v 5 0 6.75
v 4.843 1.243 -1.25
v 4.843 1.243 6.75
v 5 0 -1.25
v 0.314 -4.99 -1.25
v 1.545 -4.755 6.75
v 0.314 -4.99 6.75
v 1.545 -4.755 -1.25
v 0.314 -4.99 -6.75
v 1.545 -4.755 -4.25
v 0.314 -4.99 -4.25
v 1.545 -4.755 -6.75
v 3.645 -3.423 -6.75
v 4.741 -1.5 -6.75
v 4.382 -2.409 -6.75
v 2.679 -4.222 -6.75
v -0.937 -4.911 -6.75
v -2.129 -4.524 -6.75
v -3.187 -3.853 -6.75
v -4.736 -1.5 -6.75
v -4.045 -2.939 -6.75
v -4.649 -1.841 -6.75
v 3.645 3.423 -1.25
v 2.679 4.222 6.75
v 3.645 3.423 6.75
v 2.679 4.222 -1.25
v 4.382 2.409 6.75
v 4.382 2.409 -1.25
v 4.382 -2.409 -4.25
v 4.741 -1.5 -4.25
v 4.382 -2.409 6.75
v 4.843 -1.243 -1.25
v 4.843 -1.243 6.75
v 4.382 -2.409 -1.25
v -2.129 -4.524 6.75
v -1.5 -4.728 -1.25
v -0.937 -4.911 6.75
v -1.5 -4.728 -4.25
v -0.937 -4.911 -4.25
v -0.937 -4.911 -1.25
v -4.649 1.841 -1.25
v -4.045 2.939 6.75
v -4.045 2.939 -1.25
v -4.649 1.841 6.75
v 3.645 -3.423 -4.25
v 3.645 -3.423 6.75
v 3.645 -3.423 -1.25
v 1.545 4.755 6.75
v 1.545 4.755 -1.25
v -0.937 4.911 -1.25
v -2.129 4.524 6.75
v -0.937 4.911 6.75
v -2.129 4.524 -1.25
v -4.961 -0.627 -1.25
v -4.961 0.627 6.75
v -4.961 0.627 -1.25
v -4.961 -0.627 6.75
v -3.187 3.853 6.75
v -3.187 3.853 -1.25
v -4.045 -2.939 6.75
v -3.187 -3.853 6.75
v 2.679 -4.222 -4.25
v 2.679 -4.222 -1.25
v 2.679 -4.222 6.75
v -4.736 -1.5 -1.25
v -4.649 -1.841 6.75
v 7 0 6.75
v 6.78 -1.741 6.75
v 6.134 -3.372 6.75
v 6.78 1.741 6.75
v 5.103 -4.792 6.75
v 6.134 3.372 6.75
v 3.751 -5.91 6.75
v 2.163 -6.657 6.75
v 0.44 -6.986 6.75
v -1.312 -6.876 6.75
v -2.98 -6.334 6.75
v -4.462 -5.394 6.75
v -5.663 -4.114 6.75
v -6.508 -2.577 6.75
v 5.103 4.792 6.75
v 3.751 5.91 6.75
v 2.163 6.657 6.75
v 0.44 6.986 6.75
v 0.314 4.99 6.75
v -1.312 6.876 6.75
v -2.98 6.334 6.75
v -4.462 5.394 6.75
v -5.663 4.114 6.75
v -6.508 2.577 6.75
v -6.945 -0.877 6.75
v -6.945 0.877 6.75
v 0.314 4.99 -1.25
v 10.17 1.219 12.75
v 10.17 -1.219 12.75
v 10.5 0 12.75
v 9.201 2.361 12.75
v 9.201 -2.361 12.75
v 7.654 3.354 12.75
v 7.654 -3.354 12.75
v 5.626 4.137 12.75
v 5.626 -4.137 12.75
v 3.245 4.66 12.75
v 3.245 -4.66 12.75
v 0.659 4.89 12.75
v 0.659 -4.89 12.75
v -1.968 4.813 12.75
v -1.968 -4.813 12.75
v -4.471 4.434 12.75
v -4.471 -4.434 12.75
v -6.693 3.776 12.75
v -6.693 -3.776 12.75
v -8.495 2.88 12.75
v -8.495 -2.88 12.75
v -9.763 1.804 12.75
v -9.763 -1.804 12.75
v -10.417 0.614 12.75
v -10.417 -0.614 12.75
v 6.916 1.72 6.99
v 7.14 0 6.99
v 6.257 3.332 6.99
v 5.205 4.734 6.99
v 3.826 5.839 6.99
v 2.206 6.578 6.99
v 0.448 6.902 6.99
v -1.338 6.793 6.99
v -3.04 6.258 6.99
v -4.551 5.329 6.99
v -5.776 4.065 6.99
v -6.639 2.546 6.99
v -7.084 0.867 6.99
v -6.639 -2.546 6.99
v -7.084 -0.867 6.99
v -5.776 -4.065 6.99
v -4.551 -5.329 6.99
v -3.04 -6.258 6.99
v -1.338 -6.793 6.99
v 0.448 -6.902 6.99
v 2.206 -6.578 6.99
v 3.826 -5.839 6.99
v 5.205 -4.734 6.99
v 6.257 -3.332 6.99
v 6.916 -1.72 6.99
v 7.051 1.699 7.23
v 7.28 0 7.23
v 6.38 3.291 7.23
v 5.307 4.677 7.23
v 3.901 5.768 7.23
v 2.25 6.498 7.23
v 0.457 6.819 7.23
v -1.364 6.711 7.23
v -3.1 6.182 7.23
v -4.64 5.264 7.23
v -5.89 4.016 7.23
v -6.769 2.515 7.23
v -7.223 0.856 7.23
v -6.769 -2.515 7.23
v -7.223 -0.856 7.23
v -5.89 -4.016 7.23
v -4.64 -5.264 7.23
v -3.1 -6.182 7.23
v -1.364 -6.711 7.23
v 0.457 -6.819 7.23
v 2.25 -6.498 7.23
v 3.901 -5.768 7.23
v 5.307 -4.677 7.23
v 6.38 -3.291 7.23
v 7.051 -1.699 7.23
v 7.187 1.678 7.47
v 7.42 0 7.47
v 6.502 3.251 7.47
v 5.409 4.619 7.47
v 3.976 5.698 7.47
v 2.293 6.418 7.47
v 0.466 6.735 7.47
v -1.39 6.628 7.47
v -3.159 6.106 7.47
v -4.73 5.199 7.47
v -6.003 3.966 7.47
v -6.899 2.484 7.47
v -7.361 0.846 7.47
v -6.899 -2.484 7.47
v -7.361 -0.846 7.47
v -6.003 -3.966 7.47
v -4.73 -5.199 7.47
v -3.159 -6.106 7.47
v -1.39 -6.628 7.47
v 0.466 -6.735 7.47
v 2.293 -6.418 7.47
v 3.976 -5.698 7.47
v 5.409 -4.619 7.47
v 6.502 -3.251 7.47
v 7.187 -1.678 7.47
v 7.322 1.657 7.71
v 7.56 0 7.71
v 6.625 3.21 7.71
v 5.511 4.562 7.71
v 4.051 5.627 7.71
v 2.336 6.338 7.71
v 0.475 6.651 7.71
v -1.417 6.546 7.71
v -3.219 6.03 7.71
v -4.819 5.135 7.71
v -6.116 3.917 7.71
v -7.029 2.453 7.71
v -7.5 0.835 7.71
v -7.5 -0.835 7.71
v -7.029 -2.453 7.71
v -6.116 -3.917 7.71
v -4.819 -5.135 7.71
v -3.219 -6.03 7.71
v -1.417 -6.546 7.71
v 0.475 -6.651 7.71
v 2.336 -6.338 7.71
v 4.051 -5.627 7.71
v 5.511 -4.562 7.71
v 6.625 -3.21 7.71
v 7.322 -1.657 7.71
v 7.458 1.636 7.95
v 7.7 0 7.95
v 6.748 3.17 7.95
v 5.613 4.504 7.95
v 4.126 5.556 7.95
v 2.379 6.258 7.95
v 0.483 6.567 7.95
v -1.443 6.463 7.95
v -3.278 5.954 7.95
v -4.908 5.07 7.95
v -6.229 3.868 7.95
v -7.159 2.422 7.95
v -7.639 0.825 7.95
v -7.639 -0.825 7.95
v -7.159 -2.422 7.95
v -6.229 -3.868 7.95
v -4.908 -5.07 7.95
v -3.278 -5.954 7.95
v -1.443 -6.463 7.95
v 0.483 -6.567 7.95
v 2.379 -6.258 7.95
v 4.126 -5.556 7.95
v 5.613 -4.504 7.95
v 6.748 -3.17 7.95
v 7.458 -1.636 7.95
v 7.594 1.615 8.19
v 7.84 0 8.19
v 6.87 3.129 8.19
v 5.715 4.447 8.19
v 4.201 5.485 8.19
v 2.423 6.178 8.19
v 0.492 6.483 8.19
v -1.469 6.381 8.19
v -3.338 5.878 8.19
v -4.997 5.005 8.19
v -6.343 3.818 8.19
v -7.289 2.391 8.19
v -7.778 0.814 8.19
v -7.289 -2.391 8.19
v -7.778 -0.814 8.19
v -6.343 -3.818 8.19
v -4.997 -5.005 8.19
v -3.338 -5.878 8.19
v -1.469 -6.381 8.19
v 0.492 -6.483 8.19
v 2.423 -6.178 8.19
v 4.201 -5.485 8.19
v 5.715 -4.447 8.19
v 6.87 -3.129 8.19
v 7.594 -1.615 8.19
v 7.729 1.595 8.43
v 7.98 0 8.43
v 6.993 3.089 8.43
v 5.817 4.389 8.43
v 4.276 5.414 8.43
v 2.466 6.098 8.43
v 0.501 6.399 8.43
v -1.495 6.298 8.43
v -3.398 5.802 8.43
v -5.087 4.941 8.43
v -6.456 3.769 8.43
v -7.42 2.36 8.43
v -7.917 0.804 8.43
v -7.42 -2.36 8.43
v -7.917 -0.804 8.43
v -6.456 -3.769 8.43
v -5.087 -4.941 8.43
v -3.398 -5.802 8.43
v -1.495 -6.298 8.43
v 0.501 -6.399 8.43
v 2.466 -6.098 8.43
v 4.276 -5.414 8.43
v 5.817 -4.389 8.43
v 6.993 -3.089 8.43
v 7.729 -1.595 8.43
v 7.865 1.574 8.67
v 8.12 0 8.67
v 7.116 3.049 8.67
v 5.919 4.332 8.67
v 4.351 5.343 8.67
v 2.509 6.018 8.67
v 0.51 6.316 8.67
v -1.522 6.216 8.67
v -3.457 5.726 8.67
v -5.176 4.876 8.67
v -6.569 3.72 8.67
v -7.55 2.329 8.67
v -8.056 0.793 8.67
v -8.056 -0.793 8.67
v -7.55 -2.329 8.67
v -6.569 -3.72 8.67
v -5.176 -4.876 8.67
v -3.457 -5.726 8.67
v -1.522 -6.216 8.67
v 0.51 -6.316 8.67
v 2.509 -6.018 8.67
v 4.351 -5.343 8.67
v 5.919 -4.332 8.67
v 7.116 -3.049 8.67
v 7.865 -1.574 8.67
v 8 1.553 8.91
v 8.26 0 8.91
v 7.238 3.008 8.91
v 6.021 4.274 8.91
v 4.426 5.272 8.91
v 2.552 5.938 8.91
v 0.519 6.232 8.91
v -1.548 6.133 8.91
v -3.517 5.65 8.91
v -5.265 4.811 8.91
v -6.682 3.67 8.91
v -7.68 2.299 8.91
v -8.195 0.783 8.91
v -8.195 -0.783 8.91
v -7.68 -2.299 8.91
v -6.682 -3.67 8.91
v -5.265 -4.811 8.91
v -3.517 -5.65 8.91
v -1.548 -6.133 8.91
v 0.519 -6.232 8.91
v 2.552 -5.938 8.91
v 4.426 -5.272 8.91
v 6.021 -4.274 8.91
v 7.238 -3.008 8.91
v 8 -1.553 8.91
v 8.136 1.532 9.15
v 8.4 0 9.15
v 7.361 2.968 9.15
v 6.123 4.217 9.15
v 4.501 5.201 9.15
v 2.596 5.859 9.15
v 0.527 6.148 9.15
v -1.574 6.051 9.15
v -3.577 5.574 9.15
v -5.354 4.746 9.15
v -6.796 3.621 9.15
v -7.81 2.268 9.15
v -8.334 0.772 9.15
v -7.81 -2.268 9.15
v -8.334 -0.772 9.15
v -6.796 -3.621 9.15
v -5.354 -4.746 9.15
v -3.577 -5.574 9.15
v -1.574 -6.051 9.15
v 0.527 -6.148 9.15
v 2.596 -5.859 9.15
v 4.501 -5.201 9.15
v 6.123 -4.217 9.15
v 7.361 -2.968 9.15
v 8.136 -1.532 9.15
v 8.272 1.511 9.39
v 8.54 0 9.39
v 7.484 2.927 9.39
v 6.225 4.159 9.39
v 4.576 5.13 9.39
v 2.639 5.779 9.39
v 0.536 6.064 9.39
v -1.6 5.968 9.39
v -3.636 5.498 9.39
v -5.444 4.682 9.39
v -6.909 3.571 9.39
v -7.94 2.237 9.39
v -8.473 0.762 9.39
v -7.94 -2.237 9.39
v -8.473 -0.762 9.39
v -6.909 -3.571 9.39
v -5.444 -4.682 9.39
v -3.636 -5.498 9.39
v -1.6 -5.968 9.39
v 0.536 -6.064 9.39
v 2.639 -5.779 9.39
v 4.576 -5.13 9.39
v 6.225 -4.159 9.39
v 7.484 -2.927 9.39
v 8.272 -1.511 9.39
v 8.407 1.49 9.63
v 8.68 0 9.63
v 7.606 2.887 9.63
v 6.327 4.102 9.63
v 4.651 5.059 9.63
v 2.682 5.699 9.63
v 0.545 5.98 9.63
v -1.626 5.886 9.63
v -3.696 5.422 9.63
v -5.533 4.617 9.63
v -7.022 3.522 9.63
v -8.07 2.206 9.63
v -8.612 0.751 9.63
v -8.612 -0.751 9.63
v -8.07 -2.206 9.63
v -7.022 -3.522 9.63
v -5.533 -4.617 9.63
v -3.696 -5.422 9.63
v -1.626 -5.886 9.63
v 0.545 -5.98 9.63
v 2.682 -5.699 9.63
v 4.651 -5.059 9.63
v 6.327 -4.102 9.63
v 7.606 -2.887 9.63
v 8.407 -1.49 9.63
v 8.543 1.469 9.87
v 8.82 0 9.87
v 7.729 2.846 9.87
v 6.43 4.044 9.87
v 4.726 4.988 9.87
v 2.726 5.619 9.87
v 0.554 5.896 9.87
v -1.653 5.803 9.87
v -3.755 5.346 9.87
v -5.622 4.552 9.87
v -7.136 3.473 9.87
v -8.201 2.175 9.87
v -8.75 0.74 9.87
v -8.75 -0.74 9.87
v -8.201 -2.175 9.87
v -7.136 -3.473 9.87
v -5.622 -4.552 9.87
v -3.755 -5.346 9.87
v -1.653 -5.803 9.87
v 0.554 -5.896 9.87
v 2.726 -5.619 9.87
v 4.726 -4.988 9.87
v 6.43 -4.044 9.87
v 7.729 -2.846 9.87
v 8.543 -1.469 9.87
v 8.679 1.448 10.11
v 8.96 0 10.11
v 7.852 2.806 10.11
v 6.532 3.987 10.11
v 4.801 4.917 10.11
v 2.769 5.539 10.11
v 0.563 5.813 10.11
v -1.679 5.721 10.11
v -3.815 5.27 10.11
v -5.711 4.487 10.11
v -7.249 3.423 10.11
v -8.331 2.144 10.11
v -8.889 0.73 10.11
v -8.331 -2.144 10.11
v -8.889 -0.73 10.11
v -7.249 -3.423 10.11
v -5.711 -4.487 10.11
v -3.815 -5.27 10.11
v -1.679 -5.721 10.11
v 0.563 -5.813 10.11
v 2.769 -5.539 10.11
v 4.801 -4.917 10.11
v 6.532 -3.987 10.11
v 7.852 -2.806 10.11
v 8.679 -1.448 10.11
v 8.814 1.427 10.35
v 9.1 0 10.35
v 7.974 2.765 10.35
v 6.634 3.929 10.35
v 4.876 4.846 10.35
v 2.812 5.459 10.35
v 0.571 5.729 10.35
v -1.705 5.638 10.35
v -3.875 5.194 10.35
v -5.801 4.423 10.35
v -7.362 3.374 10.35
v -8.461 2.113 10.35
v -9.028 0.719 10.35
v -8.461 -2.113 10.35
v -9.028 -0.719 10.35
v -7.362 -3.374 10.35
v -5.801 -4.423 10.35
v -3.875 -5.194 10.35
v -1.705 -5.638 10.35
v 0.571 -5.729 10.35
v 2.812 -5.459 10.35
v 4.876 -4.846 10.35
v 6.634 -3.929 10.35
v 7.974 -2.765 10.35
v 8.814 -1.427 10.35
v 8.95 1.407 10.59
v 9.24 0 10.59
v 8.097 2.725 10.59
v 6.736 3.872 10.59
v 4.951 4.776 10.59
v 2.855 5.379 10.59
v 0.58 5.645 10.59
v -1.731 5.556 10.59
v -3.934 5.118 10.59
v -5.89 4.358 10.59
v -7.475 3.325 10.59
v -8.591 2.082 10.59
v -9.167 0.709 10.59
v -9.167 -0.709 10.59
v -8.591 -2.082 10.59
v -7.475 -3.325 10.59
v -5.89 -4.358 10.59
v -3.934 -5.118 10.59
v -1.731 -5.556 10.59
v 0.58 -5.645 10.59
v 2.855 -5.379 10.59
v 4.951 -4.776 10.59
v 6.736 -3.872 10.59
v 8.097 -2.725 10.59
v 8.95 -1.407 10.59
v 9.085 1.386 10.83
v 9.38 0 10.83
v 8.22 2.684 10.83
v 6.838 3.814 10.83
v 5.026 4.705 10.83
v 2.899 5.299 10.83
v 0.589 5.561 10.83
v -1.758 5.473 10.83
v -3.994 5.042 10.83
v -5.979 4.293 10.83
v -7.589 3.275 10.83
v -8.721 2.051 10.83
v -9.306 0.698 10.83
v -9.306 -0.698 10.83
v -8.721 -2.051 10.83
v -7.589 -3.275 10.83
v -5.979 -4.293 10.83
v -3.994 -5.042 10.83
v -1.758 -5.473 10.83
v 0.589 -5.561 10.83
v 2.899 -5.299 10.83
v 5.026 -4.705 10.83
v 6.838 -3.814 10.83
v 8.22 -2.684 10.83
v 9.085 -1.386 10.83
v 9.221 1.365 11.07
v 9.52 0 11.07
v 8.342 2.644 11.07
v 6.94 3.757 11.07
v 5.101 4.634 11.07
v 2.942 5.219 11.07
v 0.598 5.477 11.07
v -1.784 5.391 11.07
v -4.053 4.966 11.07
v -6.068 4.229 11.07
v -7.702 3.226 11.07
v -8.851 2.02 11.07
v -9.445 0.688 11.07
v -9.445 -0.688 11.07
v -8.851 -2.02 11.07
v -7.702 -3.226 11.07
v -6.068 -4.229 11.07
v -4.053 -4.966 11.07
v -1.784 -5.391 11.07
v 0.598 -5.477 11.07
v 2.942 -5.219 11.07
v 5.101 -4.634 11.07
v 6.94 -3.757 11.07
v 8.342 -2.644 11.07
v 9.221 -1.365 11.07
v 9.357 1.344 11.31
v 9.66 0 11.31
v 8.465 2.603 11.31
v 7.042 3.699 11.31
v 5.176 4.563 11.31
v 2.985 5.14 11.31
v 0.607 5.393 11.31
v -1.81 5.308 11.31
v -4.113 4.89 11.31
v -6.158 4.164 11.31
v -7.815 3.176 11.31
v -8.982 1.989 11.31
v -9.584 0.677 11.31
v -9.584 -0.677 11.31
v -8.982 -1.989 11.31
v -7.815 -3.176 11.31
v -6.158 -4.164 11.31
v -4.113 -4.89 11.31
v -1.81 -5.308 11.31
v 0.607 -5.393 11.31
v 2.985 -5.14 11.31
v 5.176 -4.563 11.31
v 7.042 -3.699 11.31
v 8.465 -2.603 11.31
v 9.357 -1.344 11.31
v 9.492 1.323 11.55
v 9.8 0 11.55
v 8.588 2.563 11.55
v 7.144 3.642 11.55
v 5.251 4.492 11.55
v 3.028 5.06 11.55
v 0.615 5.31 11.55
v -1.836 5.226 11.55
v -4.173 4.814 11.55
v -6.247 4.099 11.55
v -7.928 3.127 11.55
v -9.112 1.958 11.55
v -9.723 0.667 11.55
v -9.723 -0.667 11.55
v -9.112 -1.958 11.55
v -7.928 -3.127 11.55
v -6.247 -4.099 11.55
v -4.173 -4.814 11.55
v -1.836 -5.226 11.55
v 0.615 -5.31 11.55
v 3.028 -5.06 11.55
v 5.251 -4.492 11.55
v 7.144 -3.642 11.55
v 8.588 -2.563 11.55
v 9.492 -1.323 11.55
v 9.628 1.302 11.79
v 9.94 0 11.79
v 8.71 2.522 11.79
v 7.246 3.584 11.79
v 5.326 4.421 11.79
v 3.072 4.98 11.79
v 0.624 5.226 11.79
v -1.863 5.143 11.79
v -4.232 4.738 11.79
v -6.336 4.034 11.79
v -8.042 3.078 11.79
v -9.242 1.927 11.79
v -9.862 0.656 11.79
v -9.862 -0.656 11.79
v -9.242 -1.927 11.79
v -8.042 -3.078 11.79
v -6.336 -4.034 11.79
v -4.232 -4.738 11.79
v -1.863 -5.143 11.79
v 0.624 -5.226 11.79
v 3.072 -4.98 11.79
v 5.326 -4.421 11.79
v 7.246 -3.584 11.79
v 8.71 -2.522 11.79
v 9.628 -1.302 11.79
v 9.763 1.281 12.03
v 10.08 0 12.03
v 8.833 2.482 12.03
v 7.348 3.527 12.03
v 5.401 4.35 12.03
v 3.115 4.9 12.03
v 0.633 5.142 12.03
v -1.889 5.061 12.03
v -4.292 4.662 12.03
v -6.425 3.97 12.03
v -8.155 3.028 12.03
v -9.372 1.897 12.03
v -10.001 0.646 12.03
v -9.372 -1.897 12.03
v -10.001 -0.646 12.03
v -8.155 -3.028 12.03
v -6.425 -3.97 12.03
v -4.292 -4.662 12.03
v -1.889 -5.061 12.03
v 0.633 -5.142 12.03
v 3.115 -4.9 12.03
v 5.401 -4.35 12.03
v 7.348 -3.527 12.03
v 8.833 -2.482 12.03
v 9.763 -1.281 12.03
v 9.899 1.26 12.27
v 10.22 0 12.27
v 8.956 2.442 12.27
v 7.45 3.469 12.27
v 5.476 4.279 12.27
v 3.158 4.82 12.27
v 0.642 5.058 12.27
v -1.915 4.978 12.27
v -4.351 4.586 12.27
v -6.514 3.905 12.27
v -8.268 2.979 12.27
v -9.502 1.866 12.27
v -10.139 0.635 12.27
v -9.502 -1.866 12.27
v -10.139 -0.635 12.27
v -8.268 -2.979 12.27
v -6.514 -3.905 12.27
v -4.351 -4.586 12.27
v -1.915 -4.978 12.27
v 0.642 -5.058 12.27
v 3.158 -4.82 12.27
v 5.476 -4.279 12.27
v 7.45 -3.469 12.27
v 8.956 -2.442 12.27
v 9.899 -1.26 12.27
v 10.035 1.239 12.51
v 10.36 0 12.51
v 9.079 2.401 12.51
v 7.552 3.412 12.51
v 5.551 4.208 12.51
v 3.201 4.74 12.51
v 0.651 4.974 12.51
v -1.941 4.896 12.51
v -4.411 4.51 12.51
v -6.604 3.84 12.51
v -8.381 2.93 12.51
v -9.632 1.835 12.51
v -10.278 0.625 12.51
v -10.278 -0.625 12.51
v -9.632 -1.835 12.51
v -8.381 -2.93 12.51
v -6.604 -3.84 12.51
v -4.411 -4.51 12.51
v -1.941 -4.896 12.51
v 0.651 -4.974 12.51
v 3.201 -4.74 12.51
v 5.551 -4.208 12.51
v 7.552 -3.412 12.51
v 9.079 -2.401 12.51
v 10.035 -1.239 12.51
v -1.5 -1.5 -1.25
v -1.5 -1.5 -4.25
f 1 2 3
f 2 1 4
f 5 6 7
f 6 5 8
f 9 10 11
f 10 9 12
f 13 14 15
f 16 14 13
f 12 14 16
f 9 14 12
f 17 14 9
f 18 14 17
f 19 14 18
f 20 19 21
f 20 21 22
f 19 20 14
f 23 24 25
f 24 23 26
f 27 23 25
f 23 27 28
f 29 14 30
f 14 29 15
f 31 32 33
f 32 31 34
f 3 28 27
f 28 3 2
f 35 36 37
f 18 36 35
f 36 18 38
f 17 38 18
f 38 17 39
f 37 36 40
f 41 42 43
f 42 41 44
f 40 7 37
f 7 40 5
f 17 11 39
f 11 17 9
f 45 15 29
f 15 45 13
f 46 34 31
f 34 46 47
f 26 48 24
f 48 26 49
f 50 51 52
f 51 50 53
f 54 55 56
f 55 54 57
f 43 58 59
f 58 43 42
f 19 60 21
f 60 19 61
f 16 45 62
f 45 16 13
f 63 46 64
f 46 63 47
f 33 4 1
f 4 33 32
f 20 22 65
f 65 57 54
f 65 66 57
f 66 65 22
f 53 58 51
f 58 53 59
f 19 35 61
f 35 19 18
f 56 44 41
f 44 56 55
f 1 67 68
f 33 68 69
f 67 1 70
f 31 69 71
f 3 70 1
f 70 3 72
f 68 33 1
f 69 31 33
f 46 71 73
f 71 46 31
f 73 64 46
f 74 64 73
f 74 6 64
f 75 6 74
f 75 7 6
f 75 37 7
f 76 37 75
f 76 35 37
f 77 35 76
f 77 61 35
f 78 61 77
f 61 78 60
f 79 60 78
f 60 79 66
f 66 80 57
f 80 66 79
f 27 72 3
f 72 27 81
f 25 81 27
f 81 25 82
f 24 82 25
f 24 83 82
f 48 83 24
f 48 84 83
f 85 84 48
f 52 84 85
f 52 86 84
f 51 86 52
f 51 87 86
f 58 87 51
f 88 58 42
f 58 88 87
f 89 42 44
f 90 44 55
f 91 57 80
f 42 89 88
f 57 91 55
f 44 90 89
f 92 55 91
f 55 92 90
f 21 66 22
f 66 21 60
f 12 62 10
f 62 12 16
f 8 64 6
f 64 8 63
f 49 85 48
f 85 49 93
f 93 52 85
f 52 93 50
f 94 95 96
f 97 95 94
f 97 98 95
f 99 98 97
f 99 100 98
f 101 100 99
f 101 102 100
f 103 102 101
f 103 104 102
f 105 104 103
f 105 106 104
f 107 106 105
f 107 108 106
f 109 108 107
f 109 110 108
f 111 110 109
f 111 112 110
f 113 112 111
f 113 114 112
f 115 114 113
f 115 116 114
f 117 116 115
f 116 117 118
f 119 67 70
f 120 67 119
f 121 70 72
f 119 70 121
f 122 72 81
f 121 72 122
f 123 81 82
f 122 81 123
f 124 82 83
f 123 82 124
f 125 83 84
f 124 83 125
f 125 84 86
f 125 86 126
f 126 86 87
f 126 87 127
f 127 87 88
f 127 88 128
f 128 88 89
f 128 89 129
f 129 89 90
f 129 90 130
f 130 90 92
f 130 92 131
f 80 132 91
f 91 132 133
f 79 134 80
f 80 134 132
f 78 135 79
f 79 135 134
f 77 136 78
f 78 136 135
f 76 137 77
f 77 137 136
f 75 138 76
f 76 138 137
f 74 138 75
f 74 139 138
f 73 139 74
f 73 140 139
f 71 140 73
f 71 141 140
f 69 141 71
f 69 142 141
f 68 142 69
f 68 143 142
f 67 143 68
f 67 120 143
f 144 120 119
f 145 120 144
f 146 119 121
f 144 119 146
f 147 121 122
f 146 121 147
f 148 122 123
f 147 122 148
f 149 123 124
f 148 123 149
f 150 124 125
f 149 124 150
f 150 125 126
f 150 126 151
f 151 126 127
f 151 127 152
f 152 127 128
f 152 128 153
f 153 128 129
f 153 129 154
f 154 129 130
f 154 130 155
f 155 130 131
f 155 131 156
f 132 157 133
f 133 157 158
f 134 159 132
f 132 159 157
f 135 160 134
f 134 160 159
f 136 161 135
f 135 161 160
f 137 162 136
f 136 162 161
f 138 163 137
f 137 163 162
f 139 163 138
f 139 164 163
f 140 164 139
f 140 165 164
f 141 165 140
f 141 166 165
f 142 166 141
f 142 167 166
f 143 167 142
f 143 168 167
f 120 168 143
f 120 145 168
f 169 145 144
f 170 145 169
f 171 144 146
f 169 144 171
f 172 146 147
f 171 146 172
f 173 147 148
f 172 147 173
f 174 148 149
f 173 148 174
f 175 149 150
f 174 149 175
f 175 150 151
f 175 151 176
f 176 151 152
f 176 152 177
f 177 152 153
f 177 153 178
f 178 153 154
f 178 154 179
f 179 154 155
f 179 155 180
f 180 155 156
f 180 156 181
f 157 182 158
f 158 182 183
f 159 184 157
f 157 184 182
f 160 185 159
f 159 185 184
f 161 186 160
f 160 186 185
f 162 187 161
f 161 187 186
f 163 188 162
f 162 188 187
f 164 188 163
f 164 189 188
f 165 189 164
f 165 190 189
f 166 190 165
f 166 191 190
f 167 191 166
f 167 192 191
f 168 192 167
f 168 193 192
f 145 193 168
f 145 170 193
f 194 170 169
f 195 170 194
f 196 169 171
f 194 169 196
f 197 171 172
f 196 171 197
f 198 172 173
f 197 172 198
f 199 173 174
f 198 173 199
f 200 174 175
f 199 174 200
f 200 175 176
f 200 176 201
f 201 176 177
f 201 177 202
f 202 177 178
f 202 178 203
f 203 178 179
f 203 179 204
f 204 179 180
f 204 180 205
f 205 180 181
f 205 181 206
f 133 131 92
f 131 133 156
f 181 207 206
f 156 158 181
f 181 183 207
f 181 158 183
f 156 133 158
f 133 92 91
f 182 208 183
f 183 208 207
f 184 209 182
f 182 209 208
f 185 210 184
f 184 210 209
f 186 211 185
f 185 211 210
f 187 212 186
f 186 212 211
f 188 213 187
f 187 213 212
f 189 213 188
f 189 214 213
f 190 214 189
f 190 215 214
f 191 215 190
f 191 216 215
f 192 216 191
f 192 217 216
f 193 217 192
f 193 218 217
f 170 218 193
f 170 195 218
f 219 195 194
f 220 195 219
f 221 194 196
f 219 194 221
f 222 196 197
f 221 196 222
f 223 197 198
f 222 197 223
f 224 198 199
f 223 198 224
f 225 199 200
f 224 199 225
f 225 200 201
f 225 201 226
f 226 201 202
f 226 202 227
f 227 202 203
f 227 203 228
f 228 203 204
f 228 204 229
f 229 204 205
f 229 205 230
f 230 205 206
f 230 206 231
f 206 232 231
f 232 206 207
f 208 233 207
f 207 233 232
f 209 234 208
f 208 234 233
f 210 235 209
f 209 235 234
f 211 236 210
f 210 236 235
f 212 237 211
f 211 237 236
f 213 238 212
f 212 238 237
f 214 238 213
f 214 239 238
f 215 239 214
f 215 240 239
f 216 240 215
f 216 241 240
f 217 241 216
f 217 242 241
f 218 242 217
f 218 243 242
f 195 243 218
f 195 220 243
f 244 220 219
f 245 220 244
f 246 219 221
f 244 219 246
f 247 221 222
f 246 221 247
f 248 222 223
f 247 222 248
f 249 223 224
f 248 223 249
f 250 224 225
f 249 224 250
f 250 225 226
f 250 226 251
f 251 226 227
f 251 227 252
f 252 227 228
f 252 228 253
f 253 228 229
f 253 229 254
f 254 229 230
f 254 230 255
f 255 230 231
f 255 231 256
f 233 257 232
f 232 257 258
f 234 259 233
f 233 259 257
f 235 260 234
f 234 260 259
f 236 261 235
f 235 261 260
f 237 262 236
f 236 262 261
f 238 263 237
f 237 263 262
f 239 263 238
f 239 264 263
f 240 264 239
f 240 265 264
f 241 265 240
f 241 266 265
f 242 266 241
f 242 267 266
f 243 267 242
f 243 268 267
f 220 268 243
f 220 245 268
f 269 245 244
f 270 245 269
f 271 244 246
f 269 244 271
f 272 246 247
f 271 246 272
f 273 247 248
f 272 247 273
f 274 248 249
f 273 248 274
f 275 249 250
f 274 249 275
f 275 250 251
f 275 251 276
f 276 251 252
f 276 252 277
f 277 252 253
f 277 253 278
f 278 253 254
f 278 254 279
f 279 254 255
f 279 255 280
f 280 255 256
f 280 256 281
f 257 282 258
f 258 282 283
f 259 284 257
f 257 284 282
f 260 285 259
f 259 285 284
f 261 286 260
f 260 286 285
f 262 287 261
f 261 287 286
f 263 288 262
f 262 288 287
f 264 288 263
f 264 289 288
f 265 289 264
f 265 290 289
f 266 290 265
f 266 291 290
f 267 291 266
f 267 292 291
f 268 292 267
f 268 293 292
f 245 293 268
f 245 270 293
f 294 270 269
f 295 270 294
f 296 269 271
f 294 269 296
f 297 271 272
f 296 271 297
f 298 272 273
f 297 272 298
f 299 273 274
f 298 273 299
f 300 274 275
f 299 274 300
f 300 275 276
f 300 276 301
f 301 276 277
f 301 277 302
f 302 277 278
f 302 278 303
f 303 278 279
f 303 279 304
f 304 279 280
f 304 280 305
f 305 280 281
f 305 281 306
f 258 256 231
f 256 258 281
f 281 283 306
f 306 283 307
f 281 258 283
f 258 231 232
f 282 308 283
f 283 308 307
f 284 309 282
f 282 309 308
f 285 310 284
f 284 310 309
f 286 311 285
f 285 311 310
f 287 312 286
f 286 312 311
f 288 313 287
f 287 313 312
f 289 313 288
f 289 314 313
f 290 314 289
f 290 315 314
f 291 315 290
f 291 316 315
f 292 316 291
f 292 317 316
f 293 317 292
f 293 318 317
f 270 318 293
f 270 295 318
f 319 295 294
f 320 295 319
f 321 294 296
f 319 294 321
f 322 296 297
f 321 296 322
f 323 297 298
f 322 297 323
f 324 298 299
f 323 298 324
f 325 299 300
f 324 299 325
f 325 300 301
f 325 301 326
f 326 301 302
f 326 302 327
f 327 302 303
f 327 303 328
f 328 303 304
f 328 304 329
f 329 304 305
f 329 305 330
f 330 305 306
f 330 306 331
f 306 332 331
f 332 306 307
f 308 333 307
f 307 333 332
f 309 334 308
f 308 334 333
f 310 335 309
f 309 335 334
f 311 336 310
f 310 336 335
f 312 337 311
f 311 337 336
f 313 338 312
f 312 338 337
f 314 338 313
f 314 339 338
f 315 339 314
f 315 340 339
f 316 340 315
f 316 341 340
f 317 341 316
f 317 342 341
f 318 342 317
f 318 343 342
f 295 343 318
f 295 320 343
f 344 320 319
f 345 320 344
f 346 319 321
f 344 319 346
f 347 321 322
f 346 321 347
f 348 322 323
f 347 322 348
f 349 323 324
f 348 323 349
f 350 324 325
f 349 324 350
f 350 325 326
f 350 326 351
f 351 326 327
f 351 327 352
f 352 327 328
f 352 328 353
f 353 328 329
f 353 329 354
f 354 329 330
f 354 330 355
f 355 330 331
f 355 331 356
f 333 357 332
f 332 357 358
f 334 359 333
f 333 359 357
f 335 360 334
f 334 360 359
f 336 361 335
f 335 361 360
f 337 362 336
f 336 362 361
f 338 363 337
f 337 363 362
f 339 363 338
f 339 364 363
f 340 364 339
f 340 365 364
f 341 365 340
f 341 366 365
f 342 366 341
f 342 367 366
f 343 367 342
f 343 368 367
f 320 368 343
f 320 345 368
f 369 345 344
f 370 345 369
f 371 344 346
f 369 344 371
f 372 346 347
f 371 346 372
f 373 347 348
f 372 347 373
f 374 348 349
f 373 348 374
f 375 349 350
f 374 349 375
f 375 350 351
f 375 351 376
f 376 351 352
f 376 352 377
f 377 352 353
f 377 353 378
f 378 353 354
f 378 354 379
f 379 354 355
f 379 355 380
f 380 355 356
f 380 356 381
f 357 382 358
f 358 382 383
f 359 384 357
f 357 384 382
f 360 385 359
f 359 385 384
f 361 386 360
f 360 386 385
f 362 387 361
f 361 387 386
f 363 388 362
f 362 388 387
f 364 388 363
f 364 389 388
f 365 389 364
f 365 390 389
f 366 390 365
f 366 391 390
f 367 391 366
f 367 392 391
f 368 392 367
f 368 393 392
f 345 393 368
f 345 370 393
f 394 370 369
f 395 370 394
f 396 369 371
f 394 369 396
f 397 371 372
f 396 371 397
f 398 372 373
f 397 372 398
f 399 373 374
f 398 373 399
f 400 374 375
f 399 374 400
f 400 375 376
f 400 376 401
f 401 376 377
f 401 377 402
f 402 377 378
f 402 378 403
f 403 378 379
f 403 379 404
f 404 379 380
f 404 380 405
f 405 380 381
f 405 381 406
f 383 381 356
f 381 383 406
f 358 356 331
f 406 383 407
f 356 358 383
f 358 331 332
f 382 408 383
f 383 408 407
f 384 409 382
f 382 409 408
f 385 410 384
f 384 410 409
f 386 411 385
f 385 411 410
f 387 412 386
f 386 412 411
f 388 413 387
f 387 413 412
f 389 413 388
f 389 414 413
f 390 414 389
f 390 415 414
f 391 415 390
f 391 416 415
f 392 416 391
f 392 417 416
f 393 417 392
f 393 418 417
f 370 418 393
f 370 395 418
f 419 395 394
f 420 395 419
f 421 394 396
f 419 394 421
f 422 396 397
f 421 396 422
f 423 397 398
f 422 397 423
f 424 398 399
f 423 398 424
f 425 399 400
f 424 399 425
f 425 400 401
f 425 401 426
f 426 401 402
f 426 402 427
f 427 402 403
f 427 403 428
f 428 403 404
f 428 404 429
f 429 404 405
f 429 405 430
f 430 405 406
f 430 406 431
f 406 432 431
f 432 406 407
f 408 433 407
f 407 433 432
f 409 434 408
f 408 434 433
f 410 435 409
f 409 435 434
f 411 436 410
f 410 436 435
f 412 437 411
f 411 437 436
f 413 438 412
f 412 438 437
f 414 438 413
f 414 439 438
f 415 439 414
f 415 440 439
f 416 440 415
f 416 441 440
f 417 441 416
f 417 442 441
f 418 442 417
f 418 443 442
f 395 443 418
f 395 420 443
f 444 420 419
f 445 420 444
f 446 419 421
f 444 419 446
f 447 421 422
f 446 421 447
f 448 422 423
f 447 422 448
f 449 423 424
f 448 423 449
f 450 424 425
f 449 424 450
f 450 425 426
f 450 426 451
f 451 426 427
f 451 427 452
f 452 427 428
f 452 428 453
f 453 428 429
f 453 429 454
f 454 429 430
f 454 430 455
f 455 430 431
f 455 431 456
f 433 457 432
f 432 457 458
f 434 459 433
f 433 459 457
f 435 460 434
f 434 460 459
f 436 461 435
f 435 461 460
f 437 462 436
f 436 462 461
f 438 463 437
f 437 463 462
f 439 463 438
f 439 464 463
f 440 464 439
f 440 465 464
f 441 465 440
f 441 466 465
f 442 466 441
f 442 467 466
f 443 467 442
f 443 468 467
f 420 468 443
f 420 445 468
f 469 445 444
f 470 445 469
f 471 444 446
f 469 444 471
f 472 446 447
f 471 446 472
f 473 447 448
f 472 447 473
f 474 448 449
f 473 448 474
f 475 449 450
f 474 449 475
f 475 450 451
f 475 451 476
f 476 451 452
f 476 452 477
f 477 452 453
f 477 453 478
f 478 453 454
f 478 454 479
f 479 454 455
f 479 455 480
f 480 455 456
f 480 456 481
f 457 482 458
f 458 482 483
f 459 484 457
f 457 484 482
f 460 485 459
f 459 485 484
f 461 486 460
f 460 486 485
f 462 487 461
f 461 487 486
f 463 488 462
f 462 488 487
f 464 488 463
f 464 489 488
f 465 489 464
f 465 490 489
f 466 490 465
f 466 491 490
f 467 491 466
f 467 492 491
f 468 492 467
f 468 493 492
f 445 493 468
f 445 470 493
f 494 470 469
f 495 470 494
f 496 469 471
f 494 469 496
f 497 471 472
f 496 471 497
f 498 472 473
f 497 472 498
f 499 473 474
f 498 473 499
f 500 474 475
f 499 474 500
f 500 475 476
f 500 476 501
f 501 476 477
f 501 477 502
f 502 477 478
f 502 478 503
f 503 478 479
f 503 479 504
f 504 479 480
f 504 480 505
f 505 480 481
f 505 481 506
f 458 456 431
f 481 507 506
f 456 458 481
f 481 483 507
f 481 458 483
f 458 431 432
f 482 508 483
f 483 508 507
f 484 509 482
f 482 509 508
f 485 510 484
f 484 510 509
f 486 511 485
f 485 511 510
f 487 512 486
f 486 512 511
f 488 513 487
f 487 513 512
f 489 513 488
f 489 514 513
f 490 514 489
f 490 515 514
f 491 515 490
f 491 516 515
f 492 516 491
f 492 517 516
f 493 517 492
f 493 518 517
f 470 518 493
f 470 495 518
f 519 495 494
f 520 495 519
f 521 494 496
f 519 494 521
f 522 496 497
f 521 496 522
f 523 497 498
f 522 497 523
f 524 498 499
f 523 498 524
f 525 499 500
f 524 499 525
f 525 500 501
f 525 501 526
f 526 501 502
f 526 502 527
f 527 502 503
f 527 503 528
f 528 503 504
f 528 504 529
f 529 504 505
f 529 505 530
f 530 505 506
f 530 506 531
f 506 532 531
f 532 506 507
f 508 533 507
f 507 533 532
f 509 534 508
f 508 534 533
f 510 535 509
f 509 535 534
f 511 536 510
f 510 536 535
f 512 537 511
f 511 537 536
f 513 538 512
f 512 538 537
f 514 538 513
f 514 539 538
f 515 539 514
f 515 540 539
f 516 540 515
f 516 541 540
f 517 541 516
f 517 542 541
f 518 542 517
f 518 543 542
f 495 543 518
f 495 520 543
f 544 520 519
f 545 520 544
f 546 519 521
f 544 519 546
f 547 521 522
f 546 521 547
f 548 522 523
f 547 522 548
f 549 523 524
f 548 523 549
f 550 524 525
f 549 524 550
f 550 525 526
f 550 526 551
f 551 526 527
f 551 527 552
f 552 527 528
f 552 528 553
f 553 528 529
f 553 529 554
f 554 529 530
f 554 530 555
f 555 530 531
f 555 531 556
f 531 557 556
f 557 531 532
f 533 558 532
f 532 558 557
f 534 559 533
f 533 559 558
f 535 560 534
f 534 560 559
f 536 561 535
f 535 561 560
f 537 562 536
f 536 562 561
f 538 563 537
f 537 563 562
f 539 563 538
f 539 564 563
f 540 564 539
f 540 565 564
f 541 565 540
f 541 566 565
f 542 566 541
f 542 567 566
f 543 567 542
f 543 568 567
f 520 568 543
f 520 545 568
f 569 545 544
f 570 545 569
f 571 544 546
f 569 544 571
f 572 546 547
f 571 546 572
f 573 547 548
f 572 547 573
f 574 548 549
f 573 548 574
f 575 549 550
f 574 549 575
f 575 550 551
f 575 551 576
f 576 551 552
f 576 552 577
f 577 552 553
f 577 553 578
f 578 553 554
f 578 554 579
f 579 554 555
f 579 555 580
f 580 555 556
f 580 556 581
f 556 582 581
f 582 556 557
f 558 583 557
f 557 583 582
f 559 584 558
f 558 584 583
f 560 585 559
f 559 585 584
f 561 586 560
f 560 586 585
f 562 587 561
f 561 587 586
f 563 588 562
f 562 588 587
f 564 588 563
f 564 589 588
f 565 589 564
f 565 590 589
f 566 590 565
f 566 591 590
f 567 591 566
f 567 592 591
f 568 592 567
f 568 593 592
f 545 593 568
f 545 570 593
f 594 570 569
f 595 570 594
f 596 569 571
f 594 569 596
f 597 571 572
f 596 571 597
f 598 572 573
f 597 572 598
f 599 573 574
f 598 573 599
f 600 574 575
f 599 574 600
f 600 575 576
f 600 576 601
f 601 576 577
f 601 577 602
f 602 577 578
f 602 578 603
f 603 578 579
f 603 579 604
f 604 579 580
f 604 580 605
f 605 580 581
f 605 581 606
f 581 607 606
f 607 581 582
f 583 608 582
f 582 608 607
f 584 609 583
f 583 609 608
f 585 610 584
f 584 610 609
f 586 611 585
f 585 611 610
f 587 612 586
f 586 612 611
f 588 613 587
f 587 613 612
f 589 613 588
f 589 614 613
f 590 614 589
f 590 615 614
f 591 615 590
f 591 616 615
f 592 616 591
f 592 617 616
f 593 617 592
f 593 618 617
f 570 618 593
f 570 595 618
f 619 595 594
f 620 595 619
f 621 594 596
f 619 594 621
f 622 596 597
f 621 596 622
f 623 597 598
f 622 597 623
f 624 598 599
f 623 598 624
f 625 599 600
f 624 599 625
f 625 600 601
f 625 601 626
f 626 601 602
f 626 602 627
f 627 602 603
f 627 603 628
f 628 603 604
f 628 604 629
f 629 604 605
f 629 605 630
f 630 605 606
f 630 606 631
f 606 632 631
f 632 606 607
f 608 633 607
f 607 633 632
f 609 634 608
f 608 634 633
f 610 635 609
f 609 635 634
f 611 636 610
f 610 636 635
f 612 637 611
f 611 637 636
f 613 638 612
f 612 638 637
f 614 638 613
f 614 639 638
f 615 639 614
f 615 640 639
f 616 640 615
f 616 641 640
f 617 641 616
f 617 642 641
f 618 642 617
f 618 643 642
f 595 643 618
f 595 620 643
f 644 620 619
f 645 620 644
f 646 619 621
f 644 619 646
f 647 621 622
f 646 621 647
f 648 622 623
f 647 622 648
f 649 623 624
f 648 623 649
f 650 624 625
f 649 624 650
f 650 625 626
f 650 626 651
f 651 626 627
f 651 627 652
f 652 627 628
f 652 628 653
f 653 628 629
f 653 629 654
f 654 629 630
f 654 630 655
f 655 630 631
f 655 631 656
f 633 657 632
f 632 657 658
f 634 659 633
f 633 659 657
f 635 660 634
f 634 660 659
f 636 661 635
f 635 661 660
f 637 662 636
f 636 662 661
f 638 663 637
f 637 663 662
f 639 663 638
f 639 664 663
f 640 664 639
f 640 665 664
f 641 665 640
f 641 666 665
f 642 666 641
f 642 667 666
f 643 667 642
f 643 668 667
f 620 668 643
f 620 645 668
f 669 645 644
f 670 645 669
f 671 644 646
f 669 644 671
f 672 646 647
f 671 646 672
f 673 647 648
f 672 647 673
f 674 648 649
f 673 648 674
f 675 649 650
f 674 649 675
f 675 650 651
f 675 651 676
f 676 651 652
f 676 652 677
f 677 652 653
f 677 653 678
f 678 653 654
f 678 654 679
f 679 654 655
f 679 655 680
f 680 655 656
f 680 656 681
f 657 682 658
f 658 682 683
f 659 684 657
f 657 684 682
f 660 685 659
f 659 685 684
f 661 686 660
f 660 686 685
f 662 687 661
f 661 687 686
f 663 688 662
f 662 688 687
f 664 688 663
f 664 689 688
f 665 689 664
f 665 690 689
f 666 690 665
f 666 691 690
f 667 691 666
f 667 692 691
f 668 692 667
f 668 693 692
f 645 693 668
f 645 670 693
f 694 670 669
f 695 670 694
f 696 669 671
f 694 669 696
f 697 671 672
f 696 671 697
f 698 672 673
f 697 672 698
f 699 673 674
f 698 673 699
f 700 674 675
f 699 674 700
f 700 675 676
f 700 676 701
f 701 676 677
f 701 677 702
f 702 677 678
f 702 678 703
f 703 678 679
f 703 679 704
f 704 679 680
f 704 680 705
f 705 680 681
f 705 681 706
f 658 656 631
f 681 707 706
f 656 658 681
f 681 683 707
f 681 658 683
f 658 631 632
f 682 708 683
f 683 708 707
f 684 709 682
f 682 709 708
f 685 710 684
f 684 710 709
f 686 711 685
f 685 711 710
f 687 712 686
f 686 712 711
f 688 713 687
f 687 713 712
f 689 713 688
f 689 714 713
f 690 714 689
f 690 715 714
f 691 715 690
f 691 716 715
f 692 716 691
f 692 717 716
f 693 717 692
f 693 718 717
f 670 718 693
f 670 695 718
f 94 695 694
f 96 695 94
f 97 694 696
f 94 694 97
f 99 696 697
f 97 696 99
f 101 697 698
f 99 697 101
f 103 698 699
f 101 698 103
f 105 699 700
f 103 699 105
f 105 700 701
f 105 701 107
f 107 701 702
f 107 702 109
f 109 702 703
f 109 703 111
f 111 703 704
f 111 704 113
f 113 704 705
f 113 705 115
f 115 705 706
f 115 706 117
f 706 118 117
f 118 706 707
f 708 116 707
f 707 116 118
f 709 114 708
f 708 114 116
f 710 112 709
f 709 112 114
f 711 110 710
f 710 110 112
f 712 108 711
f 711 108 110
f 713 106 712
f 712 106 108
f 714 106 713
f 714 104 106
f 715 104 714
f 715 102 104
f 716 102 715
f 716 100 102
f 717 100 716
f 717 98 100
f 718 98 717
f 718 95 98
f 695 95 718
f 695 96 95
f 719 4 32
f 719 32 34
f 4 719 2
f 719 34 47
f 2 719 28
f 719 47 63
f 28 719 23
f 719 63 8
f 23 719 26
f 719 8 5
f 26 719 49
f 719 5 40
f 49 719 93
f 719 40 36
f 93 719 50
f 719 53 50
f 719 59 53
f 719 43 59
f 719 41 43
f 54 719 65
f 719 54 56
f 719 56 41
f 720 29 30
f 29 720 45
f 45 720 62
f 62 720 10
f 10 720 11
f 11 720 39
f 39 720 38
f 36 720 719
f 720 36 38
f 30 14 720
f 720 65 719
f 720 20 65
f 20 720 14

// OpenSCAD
$fn=25;
big_e = 0.3;

h=13.5;
h2=6;
d=10;
d2=d+4;
d_cube=2*h;
thickness = 2.8+1.2;
pin_d = 3;
pin_offset = h-2*thickness-pin_d;

camlock();
//camlock_housing();

/*
difference(){
    rotate([0,0,0])color("red")camlock();
    translate([-15,-15,0])cube(30);
}
//translate([10,0,0,])
color("green"){
    difference(){
        translate([0,0,big_e*1.5])camlock_housing();
        //translate([-10,-30,-15])cube(30);
    }
}

*/
module camlock(){
    difference(){
        union(){
            cylinder(h=h, d=d, center=true);
            //translate([0,0,h/2+h2/2])cylinder(h=h2, d=d2, center=true);
            translate([0,0,h/2])linear_extrude(height=h2, scale=[1.5, 0.7])circle(d=d2);
        }
        translate([-pin_d/2,-d_cube/2,-h/2+pin_offset])cube([d_cube,d_cube,pin_d]);
        translate([-d_cube/2,-pin_d/2,-d_cube-h/2+pin_offset+pin_d])cube(d_cube);
    }
}

module camlock_housing(){
    h_cylinder = h-2*thickness+big_e*2;
    h_cube = h_cylinder; //+pin_d/2;
    difference(){
        translate([0,0,-h_cube/2])cube([d2,d2,h_cube], center=true);
        translate([0,0,-h_cylinder/2])cylinder(d=d+big_e,h=h_cylinder+big_e, center=true);
    }
    translate([0,0,-pin_d/2+big_e/2])cube([pin_d-big_e, d+2*big_e, pin_d-big_e], center=true);
}
